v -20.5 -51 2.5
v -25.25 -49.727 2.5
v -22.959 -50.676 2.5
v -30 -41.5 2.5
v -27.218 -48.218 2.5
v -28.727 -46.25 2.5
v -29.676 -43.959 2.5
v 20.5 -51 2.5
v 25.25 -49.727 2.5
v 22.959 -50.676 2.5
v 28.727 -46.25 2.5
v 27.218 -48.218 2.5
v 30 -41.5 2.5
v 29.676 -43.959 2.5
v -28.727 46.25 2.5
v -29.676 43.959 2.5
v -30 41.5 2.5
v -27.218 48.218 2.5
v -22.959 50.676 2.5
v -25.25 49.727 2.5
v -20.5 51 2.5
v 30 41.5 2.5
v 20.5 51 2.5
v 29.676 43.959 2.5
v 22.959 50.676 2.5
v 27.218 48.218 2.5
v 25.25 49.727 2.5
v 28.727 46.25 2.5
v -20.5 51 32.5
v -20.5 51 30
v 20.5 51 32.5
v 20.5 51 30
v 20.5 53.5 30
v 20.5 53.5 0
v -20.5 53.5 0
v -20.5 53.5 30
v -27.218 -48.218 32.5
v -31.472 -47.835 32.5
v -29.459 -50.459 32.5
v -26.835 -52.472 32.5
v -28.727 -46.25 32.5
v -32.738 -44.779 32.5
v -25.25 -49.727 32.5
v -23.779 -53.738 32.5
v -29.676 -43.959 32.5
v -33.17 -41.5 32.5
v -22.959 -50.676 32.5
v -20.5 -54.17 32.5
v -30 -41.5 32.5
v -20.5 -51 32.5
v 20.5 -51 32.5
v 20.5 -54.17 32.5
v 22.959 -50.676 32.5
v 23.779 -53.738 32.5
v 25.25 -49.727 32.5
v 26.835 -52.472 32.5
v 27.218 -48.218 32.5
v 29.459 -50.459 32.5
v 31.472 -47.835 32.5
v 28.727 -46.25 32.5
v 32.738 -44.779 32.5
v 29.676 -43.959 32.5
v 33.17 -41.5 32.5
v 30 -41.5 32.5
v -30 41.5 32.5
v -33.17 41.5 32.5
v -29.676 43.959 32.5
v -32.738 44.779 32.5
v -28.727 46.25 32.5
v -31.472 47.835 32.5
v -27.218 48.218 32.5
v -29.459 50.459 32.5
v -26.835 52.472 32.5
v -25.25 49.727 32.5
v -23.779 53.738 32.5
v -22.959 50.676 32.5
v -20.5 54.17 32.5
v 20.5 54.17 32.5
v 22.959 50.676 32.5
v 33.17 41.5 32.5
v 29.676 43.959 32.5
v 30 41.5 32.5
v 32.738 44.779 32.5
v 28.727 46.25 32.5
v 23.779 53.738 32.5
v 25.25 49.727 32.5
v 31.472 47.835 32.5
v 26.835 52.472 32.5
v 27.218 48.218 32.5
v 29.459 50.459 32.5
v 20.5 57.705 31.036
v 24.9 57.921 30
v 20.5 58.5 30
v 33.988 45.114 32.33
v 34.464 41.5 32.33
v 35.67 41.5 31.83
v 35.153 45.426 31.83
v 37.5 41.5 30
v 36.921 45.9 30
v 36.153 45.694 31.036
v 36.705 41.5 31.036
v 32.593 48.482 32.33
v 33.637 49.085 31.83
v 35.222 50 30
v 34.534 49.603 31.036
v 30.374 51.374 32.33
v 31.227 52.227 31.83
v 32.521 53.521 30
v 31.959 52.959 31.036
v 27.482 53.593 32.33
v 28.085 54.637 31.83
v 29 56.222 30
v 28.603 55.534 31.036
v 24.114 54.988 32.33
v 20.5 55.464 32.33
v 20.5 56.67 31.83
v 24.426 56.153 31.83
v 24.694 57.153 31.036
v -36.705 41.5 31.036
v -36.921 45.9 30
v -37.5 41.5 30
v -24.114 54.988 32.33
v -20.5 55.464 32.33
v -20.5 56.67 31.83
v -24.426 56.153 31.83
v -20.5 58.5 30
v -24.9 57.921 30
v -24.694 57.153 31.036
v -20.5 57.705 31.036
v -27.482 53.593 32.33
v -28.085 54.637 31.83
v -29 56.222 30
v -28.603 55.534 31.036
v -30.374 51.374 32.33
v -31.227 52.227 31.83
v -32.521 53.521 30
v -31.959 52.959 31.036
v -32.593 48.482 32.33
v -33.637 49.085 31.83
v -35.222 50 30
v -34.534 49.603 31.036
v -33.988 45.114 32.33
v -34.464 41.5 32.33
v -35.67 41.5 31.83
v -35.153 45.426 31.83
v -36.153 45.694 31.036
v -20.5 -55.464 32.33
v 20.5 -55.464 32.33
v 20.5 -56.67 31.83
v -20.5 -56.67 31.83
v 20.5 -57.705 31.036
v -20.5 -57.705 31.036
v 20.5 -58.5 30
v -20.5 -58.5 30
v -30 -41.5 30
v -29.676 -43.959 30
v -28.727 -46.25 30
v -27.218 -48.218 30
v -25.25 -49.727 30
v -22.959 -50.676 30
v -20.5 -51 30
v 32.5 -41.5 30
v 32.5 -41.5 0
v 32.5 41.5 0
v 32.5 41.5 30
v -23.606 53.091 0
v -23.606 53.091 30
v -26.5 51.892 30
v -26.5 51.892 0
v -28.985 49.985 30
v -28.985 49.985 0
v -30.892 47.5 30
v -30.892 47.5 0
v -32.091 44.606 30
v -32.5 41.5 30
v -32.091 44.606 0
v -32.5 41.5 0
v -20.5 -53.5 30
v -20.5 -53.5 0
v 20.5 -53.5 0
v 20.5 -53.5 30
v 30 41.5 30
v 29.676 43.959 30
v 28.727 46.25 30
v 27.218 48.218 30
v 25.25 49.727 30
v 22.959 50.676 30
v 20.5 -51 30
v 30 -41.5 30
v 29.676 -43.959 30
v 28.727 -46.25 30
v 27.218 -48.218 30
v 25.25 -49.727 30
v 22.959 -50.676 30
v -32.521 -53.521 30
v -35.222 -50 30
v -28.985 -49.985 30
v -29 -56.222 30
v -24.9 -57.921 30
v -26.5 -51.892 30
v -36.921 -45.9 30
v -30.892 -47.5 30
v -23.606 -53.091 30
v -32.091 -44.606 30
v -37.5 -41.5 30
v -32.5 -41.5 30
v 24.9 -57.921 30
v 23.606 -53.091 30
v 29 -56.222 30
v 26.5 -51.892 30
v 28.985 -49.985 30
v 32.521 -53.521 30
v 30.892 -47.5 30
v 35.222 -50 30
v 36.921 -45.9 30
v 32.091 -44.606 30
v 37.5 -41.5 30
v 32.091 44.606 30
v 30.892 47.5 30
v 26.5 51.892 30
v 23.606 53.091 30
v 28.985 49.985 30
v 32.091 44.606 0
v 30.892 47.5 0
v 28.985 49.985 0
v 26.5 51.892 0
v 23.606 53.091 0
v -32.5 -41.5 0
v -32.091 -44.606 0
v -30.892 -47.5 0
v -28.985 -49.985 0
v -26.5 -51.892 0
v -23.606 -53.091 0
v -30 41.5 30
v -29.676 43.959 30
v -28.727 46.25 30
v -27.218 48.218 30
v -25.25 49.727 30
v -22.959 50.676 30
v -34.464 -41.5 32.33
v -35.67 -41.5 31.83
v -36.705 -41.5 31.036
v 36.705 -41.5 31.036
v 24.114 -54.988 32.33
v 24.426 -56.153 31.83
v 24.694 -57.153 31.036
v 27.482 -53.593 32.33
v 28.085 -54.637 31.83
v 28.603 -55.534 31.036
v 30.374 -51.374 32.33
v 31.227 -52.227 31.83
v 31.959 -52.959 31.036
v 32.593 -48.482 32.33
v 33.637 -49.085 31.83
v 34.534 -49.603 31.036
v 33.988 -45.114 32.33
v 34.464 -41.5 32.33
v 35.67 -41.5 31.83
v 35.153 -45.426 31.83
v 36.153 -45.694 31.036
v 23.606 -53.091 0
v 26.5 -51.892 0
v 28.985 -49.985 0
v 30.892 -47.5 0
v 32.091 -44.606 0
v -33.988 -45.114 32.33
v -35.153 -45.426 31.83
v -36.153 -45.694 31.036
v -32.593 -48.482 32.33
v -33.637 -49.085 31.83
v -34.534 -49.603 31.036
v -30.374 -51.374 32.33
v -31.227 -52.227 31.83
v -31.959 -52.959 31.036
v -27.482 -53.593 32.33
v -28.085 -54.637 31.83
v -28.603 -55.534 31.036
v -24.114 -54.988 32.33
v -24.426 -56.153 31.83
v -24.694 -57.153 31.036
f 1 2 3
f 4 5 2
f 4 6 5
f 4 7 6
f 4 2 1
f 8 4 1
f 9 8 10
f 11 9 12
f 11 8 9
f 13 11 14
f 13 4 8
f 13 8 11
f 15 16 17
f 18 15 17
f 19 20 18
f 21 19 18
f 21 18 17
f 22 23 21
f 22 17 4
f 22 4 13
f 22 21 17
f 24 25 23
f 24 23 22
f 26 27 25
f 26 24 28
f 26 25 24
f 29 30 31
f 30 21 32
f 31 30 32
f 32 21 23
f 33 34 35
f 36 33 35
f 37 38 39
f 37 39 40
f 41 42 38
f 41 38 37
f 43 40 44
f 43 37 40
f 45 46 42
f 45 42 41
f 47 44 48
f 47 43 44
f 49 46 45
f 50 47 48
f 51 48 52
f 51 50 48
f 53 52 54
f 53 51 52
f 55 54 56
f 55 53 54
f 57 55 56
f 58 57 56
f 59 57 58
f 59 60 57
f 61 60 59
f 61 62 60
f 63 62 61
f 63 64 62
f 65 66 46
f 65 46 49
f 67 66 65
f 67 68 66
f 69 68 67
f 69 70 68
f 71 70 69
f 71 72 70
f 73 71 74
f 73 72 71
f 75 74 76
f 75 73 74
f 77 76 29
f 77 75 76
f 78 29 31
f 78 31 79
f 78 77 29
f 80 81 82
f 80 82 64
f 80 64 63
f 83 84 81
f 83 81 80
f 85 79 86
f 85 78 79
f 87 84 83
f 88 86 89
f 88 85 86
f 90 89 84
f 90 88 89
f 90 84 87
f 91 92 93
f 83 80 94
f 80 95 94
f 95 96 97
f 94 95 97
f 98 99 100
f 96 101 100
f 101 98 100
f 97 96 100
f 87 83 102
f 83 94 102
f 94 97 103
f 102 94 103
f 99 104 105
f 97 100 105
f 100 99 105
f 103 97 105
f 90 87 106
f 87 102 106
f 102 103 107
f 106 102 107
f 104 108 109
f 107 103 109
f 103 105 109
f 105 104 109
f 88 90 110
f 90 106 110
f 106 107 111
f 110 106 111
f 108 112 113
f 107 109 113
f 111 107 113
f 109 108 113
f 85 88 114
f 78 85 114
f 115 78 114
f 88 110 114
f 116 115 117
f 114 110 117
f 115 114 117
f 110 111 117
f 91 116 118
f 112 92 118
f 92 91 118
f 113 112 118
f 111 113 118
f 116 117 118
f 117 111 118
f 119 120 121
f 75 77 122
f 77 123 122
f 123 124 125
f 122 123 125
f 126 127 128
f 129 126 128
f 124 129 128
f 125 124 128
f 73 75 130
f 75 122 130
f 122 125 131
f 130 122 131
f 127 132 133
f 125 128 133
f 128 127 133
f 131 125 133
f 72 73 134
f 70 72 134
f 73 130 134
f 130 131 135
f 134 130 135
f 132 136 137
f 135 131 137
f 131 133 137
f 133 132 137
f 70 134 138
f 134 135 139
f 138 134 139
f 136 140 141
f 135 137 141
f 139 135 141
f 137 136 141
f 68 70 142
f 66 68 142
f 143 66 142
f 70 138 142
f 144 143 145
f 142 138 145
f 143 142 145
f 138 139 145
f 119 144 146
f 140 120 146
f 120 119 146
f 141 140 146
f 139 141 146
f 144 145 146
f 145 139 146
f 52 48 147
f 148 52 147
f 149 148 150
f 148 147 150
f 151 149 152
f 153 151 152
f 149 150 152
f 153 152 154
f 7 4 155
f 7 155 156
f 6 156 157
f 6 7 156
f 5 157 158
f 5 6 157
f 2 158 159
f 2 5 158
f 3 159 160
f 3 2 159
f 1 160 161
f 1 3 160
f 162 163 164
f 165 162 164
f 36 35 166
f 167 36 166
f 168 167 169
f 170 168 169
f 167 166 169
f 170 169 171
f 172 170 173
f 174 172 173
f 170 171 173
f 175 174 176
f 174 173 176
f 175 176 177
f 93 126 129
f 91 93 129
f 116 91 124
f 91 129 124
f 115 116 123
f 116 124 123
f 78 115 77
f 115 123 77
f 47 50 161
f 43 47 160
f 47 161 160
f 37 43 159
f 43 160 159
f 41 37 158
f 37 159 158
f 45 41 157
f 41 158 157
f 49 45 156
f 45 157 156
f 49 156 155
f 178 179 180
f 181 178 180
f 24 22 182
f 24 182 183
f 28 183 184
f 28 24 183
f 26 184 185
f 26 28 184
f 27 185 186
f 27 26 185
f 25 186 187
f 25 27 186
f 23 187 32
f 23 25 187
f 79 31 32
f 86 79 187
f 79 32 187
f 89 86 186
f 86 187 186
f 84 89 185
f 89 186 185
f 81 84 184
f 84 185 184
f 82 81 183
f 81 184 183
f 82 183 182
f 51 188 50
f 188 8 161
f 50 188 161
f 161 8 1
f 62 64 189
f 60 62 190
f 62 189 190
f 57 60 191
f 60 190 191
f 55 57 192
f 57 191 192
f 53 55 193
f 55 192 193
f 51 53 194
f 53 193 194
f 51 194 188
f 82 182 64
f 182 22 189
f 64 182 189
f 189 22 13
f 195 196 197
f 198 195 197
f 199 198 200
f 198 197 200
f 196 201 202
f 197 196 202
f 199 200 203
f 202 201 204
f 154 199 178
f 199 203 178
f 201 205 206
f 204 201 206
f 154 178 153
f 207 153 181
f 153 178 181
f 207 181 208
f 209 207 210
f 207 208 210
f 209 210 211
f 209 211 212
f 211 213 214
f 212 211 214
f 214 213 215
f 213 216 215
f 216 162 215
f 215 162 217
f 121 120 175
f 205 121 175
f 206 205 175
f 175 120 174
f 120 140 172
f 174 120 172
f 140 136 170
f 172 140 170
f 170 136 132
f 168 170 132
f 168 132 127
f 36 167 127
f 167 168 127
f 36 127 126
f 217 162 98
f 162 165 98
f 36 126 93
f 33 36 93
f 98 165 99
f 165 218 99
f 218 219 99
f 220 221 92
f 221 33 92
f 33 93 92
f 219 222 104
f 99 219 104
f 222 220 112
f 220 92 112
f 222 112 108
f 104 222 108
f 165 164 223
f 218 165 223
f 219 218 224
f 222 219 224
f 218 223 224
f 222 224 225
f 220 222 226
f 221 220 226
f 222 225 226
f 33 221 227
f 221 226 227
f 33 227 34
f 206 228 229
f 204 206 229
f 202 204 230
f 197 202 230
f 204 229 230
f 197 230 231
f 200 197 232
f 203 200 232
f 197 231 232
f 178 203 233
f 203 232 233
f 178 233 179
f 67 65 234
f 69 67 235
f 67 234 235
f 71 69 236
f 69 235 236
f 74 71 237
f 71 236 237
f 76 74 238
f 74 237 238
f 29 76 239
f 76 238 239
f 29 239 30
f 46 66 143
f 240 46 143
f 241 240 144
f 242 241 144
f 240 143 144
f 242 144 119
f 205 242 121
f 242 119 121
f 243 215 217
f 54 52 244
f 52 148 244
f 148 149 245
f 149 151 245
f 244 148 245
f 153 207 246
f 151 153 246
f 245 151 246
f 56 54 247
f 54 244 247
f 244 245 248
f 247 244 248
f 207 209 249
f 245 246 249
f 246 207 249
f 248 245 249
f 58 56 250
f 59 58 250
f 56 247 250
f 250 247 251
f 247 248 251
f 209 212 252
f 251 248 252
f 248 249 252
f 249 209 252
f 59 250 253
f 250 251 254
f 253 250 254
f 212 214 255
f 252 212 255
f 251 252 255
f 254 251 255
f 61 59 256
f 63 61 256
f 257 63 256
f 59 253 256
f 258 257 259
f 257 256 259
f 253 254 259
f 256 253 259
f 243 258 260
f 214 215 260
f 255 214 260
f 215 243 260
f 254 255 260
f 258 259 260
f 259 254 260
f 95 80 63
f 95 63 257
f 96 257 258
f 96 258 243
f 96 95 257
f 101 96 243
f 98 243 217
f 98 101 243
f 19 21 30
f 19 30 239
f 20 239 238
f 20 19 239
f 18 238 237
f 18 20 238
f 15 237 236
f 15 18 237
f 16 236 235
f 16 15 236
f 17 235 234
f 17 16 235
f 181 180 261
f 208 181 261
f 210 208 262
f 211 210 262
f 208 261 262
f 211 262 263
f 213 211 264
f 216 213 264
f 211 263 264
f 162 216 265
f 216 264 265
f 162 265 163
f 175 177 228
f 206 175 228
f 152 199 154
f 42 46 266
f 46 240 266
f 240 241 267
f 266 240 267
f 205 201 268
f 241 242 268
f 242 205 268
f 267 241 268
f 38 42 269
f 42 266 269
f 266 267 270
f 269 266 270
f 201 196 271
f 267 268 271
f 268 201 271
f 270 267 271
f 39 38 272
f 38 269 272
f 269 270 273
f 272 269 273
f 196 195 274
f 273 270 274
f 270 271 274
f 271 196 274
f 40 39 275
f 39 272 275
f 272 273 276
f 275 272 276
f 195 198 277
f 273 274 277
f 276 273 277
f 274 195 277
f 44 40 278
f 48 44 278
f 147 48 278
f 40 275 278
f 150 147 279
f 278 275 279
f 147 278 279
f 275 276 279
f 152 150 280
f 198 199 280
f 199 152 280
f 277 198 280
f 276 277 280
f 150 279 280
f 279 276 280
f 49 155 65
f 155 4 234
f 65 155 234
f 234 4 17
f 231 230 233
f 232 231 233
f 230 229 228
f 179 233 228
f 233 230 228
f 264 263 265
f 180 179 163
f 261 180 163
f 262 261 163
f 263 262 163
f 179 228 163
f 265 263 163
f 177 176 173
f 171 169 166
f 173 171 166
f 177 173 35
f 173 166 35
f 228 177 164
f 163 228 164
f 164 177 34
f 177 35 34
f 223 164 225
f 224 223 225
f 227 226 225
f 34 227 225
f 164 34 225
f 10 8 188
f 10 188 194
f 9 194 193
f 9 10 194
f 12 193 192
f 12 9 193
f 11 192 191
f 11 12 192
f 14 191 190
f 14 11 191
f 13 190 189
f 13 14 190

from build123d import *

# Parameters (mm, degrees)
F1_DEPTH     = 30
F2_T         = -2.5
F4_DEPTH     = 2.5
F5_T1_DEPTH  = 83
F5_T3_DEPTH  = 41
F5_T6_ANGLE  = 90
F5_T8_ANGLE  = 90
F5_T10_ANGLE = 90
F5_T12_ANGLE = 90


# Not quite as in the source:
# - a fillet or chamfer that OpenCascade refuses, or shapes differently, is made with other operations: its cross-section is extruded or revolved along the edge and cut away or added


with BuildPart() as f1:
    # F0 (on Top) → F1 (new body)
    with BuildSketch(Plane.XY):
        with BuildLine():
            ThreePointArc((32.5, 41.5), (28.9852813742, 49.9852813742), (20.5, 53.5))
            Line((20.5, 53.5), (-20.5, 53.5))
            ThreePointArc((-20.5, 53.5), (-28.9852813742, 49.9852813742), (-32.5, 41.5))
            Line((-32.5, 41.5), (-32.5, -41.5))
            ThreePointArc((-32.5, -41.5), (-28.9852813742, -49.9852813742), (-20.5, -53.5))
            Line((-20.5, -53.5), (20.5, -53.5))
            ThreePointArc((20.5, -53.5), (28.9852813742, -49.9852813742), (32.5, -41.5))
            Line((32.5, -41.5), (32.5, 41.5))
        make_face()
    extrude(amount=F1_DEPTH)

    # F2
    f2_openings = [f1.faces().sort_by_distance(p)[0] for p in [
        (0, 0, 30),
    ]]
    offset(amount=F2_T, openings=f2_openings)

    # F3 (on face) → F4 (join)
    with BuildSketch(Plane.XY.offset(30)):
        with BuildLine():
            Line((-20.5, -58.5), (20.5, -58.5))
            ThreePointArc((20.5, -58.5), (32.5208152802, -53.5208152802), (37.5, -41.5))
            Line((37.5, -41.5), (37.5, 41.5))
            ThreePointArc((37.5, 41.5), (32.5208152802, 53.5208152802), (20.5, 58.5))
            Line((20.5, 58.5), (-20.5, 58.5))
            ThreePointArc((-20.5, 58.5), (-32.5208152802, 53.5208152802), (-37.5, 41.5))
            Line((-37.5, 41.5), (-37.5, -41.5))
            ThreePointArc((-37.5, -41.5), (-32.5208152802, -53.5208152802), (-20.5, -58.5))
        make_face()
        with BuildLine():
            ThreePointArc((20.5, 53.5), (28.9852813742, 49.9852813742), (32.5, 41.5))
            Line((32.5, 41.5), (32.5, -41.5))
            ThreePointArc((32.5, -41.5), (28.9852813742, -49.9852813742), (20.5, -53.5))
            Line((20.5, -53.5), (-20.5, -53.5))
            ThreePointArc((-20.5, -53.5), (-28.9852813742, -49.9852813742), (-32.5, -41.5))
            Line((-32.5, -41.5), (-32.5, 41.5))
            ThreePointArc((-32.5, 41.5), (-28.9852813742, 49.9852813742), (-20.5, 53.5))
            Line((-20.5, 53.5), (20.5, 53.5))
        make_face(mode=Mode.SUBTRACT)
        with BuildLine():
            Line((32.5, -41.5), (32.5, 41.5))
            ThreePointArc((32.5, 41.5), (28.9852813742, 49.9852813742), (20.5, 53.5))
            Line((20.5, 53.5), (-20.5, 53.5))
            ThreePointArc((-20.5, 53.5), (-28.9852813742, 49.9852813742), (-32.5, 41.5))
            Line((-32.5, 41.5), (-32.5, -41.5))
            ThreePointArc((-32.5, -41.5), (-28.9852813742, -49.9852813742), (-20.5, -53.5))
            Line((-20.5, -53.5), (20.5, -53.5))
            ThreePointArc((20.5, -53.5), (28.9852813742, -49.9852813742), (32.5, -41.5))
        make_face()
        with BuildLine():
            Line((-20.5, 51), (20.5, 51))
            ThreePointArc((20.5, 51), (27.2175144213, 48.2175144213), (30, 41.5))
            Line((30, 41.5), (30, -41.5))
            ThreePointArc((30, -41.5), (27.2175144213, -48.2175144213), (20.5, -51))
            Line((20.5, -51), (-20.5, -51))
            ThreePointArc((-20.5, -51), (-27.2175144213, -48.2175144213), (-30, -41.5))
            Line((-30, -41.5), (-30, 41.5))
            ThreePointArc((-30, 41.5), (-27.2175144213, 48.2175144213), (-20.5, 51))
        make_face(mode=Mode.SUBTRACT)
    extrude(amount=F4_DEPTH)

    # F5: fillet of radius 5 on 1 edges, made by hand

    # F5_s2 → F5_t1 (cut)
    with BuildSketch(Plane.XZ.offset(-41.5)):
        with BuildLine():
            ThreePointArc((33.1698729811, 32.5), (35.6698729811, 31.8301270189), (37.5, 30))
            Line((37.5, 30), (37.5, 32.5))
            Line((37.5, 32.5), (33.1698729811, 32.5))
        make_face()
        with BuildLine():
            ThreePointArc((-33.1698729811, 32.5), (-35.6698729811, 31.8301270189), (-37.5, 30))
            Line((-37.5, 30), (-37.5, 32.5))
            Line((-37.5, 32.5), (-33.1698729811, 32.5))
        make_face()
    extrude(amount=F5_T1_DEPTH, mode=Mode.SUBTRACT)

    # F5_s4 → F5_t3 (cut)
    with BuildSketch(Plane.YZ.offset(-20.5)):
        with BuildLine():
            ThreePointArc((58.5, 30), (56.6698729811, 31.8301270189), (54.1698729811, 32.5))
            Line((54.1698729811, 32.5), (58.5, 32.5))
            Line((58.5, 32.5), (58.5, 30))
        make_face()
        with BuildLine():
            ThreePointArc((-54.1698729811, 32.5), (-56.6698729811, 31.8301270189), (-58.5, 30))
            Line((-58.5, 30), (-58.5, 32.5))
            Line((-58.5, 32.5), (-54.1698729811, 32.5))
        make_face()
    extrude(amount=F5_T3_DEPTH, mode=Mode.SUBTRACT)

    # F5_s5 → F5_t6 (revolve, cut)
    with BuildSketch(Plane.YZ.offset(20.5)):
        with BuildLine():
            ThreePointArc((-54.1698729811, 32.5), (-56.6698729811, 31.8301270189), (-58.5, 30))
            Line((-58.5, 30), (-58.5, 32.5))
            Line((-58.5, 32.5), (-54.1698729811, 32.5))
        make_face()
    revolve(axis=Axis((20.5, -41.5, 32.5), (0, 0, 1)), revolution_arc=F5_T6_ANGLE, mode=Mode.SUBTRACT)

    # F5_s7 → F5_t8 (revolve, cut)
    with BuildSketch(Plane.XZ.offset(-41.5)):
        with BuildLine():
            ThreePointArc((33.1698729811, 32.5), (35.6698729811, 31.8301270189), (37.5, 30))
            Line((37.5, 30), (37.5, 32.5))
            Line((37.5, 32.5), (33.1698729811, 32.5))
        make_face()
    revolve(axis=Axis((20.5, 41.5, 32.5), (0, 0, 1)), revolution_arc=F5_T8_ANGLE, mode=Mode.SUBTRACT)

    # F5_s9 → F5_t10 (revolve, cut)
    with BuildSketch(Plane.YZ.offset(-20.5)):
        with BuildLine():
            ThreePointArc((54.1698729811, 32.5), (56.6698729811, 31.8301270189), (58.5, 30))
            Line((58.5, 30), (58.5, 32.5))
            Line((58.5, 32.5), (54.1698729811, 32.5))
        make_face()
    revolve(axis=Axis((-20.5, 41.5, 32.5), (0, 0, 1)), revolution_arc=F5_T10_ANGLE, mode=Mode.SUBTRACT)

    # F5_s11 → F5_t12 (revolve, cut)
    with BuildSketch(Plane.XZ.offset(41.5)):
        with BuildLine():
            ThreePointArc((-33.1698729811, 32.5), (-35.6698729811, 31.8301270189), (-37.5, 30))
            Line((-37.5, 30), (-37.5, 32.5))
            Line((-37.5, 32.5), (-33.1698729811, 32.5))
        make_face()
    revolve(axis=Axis((-20.5, -41.5, 32.5), (0, 0, 1)), revolution_arc=F5_T12_ANGLE, mode=Mode.SUBTRACT)


solid = f1.part
